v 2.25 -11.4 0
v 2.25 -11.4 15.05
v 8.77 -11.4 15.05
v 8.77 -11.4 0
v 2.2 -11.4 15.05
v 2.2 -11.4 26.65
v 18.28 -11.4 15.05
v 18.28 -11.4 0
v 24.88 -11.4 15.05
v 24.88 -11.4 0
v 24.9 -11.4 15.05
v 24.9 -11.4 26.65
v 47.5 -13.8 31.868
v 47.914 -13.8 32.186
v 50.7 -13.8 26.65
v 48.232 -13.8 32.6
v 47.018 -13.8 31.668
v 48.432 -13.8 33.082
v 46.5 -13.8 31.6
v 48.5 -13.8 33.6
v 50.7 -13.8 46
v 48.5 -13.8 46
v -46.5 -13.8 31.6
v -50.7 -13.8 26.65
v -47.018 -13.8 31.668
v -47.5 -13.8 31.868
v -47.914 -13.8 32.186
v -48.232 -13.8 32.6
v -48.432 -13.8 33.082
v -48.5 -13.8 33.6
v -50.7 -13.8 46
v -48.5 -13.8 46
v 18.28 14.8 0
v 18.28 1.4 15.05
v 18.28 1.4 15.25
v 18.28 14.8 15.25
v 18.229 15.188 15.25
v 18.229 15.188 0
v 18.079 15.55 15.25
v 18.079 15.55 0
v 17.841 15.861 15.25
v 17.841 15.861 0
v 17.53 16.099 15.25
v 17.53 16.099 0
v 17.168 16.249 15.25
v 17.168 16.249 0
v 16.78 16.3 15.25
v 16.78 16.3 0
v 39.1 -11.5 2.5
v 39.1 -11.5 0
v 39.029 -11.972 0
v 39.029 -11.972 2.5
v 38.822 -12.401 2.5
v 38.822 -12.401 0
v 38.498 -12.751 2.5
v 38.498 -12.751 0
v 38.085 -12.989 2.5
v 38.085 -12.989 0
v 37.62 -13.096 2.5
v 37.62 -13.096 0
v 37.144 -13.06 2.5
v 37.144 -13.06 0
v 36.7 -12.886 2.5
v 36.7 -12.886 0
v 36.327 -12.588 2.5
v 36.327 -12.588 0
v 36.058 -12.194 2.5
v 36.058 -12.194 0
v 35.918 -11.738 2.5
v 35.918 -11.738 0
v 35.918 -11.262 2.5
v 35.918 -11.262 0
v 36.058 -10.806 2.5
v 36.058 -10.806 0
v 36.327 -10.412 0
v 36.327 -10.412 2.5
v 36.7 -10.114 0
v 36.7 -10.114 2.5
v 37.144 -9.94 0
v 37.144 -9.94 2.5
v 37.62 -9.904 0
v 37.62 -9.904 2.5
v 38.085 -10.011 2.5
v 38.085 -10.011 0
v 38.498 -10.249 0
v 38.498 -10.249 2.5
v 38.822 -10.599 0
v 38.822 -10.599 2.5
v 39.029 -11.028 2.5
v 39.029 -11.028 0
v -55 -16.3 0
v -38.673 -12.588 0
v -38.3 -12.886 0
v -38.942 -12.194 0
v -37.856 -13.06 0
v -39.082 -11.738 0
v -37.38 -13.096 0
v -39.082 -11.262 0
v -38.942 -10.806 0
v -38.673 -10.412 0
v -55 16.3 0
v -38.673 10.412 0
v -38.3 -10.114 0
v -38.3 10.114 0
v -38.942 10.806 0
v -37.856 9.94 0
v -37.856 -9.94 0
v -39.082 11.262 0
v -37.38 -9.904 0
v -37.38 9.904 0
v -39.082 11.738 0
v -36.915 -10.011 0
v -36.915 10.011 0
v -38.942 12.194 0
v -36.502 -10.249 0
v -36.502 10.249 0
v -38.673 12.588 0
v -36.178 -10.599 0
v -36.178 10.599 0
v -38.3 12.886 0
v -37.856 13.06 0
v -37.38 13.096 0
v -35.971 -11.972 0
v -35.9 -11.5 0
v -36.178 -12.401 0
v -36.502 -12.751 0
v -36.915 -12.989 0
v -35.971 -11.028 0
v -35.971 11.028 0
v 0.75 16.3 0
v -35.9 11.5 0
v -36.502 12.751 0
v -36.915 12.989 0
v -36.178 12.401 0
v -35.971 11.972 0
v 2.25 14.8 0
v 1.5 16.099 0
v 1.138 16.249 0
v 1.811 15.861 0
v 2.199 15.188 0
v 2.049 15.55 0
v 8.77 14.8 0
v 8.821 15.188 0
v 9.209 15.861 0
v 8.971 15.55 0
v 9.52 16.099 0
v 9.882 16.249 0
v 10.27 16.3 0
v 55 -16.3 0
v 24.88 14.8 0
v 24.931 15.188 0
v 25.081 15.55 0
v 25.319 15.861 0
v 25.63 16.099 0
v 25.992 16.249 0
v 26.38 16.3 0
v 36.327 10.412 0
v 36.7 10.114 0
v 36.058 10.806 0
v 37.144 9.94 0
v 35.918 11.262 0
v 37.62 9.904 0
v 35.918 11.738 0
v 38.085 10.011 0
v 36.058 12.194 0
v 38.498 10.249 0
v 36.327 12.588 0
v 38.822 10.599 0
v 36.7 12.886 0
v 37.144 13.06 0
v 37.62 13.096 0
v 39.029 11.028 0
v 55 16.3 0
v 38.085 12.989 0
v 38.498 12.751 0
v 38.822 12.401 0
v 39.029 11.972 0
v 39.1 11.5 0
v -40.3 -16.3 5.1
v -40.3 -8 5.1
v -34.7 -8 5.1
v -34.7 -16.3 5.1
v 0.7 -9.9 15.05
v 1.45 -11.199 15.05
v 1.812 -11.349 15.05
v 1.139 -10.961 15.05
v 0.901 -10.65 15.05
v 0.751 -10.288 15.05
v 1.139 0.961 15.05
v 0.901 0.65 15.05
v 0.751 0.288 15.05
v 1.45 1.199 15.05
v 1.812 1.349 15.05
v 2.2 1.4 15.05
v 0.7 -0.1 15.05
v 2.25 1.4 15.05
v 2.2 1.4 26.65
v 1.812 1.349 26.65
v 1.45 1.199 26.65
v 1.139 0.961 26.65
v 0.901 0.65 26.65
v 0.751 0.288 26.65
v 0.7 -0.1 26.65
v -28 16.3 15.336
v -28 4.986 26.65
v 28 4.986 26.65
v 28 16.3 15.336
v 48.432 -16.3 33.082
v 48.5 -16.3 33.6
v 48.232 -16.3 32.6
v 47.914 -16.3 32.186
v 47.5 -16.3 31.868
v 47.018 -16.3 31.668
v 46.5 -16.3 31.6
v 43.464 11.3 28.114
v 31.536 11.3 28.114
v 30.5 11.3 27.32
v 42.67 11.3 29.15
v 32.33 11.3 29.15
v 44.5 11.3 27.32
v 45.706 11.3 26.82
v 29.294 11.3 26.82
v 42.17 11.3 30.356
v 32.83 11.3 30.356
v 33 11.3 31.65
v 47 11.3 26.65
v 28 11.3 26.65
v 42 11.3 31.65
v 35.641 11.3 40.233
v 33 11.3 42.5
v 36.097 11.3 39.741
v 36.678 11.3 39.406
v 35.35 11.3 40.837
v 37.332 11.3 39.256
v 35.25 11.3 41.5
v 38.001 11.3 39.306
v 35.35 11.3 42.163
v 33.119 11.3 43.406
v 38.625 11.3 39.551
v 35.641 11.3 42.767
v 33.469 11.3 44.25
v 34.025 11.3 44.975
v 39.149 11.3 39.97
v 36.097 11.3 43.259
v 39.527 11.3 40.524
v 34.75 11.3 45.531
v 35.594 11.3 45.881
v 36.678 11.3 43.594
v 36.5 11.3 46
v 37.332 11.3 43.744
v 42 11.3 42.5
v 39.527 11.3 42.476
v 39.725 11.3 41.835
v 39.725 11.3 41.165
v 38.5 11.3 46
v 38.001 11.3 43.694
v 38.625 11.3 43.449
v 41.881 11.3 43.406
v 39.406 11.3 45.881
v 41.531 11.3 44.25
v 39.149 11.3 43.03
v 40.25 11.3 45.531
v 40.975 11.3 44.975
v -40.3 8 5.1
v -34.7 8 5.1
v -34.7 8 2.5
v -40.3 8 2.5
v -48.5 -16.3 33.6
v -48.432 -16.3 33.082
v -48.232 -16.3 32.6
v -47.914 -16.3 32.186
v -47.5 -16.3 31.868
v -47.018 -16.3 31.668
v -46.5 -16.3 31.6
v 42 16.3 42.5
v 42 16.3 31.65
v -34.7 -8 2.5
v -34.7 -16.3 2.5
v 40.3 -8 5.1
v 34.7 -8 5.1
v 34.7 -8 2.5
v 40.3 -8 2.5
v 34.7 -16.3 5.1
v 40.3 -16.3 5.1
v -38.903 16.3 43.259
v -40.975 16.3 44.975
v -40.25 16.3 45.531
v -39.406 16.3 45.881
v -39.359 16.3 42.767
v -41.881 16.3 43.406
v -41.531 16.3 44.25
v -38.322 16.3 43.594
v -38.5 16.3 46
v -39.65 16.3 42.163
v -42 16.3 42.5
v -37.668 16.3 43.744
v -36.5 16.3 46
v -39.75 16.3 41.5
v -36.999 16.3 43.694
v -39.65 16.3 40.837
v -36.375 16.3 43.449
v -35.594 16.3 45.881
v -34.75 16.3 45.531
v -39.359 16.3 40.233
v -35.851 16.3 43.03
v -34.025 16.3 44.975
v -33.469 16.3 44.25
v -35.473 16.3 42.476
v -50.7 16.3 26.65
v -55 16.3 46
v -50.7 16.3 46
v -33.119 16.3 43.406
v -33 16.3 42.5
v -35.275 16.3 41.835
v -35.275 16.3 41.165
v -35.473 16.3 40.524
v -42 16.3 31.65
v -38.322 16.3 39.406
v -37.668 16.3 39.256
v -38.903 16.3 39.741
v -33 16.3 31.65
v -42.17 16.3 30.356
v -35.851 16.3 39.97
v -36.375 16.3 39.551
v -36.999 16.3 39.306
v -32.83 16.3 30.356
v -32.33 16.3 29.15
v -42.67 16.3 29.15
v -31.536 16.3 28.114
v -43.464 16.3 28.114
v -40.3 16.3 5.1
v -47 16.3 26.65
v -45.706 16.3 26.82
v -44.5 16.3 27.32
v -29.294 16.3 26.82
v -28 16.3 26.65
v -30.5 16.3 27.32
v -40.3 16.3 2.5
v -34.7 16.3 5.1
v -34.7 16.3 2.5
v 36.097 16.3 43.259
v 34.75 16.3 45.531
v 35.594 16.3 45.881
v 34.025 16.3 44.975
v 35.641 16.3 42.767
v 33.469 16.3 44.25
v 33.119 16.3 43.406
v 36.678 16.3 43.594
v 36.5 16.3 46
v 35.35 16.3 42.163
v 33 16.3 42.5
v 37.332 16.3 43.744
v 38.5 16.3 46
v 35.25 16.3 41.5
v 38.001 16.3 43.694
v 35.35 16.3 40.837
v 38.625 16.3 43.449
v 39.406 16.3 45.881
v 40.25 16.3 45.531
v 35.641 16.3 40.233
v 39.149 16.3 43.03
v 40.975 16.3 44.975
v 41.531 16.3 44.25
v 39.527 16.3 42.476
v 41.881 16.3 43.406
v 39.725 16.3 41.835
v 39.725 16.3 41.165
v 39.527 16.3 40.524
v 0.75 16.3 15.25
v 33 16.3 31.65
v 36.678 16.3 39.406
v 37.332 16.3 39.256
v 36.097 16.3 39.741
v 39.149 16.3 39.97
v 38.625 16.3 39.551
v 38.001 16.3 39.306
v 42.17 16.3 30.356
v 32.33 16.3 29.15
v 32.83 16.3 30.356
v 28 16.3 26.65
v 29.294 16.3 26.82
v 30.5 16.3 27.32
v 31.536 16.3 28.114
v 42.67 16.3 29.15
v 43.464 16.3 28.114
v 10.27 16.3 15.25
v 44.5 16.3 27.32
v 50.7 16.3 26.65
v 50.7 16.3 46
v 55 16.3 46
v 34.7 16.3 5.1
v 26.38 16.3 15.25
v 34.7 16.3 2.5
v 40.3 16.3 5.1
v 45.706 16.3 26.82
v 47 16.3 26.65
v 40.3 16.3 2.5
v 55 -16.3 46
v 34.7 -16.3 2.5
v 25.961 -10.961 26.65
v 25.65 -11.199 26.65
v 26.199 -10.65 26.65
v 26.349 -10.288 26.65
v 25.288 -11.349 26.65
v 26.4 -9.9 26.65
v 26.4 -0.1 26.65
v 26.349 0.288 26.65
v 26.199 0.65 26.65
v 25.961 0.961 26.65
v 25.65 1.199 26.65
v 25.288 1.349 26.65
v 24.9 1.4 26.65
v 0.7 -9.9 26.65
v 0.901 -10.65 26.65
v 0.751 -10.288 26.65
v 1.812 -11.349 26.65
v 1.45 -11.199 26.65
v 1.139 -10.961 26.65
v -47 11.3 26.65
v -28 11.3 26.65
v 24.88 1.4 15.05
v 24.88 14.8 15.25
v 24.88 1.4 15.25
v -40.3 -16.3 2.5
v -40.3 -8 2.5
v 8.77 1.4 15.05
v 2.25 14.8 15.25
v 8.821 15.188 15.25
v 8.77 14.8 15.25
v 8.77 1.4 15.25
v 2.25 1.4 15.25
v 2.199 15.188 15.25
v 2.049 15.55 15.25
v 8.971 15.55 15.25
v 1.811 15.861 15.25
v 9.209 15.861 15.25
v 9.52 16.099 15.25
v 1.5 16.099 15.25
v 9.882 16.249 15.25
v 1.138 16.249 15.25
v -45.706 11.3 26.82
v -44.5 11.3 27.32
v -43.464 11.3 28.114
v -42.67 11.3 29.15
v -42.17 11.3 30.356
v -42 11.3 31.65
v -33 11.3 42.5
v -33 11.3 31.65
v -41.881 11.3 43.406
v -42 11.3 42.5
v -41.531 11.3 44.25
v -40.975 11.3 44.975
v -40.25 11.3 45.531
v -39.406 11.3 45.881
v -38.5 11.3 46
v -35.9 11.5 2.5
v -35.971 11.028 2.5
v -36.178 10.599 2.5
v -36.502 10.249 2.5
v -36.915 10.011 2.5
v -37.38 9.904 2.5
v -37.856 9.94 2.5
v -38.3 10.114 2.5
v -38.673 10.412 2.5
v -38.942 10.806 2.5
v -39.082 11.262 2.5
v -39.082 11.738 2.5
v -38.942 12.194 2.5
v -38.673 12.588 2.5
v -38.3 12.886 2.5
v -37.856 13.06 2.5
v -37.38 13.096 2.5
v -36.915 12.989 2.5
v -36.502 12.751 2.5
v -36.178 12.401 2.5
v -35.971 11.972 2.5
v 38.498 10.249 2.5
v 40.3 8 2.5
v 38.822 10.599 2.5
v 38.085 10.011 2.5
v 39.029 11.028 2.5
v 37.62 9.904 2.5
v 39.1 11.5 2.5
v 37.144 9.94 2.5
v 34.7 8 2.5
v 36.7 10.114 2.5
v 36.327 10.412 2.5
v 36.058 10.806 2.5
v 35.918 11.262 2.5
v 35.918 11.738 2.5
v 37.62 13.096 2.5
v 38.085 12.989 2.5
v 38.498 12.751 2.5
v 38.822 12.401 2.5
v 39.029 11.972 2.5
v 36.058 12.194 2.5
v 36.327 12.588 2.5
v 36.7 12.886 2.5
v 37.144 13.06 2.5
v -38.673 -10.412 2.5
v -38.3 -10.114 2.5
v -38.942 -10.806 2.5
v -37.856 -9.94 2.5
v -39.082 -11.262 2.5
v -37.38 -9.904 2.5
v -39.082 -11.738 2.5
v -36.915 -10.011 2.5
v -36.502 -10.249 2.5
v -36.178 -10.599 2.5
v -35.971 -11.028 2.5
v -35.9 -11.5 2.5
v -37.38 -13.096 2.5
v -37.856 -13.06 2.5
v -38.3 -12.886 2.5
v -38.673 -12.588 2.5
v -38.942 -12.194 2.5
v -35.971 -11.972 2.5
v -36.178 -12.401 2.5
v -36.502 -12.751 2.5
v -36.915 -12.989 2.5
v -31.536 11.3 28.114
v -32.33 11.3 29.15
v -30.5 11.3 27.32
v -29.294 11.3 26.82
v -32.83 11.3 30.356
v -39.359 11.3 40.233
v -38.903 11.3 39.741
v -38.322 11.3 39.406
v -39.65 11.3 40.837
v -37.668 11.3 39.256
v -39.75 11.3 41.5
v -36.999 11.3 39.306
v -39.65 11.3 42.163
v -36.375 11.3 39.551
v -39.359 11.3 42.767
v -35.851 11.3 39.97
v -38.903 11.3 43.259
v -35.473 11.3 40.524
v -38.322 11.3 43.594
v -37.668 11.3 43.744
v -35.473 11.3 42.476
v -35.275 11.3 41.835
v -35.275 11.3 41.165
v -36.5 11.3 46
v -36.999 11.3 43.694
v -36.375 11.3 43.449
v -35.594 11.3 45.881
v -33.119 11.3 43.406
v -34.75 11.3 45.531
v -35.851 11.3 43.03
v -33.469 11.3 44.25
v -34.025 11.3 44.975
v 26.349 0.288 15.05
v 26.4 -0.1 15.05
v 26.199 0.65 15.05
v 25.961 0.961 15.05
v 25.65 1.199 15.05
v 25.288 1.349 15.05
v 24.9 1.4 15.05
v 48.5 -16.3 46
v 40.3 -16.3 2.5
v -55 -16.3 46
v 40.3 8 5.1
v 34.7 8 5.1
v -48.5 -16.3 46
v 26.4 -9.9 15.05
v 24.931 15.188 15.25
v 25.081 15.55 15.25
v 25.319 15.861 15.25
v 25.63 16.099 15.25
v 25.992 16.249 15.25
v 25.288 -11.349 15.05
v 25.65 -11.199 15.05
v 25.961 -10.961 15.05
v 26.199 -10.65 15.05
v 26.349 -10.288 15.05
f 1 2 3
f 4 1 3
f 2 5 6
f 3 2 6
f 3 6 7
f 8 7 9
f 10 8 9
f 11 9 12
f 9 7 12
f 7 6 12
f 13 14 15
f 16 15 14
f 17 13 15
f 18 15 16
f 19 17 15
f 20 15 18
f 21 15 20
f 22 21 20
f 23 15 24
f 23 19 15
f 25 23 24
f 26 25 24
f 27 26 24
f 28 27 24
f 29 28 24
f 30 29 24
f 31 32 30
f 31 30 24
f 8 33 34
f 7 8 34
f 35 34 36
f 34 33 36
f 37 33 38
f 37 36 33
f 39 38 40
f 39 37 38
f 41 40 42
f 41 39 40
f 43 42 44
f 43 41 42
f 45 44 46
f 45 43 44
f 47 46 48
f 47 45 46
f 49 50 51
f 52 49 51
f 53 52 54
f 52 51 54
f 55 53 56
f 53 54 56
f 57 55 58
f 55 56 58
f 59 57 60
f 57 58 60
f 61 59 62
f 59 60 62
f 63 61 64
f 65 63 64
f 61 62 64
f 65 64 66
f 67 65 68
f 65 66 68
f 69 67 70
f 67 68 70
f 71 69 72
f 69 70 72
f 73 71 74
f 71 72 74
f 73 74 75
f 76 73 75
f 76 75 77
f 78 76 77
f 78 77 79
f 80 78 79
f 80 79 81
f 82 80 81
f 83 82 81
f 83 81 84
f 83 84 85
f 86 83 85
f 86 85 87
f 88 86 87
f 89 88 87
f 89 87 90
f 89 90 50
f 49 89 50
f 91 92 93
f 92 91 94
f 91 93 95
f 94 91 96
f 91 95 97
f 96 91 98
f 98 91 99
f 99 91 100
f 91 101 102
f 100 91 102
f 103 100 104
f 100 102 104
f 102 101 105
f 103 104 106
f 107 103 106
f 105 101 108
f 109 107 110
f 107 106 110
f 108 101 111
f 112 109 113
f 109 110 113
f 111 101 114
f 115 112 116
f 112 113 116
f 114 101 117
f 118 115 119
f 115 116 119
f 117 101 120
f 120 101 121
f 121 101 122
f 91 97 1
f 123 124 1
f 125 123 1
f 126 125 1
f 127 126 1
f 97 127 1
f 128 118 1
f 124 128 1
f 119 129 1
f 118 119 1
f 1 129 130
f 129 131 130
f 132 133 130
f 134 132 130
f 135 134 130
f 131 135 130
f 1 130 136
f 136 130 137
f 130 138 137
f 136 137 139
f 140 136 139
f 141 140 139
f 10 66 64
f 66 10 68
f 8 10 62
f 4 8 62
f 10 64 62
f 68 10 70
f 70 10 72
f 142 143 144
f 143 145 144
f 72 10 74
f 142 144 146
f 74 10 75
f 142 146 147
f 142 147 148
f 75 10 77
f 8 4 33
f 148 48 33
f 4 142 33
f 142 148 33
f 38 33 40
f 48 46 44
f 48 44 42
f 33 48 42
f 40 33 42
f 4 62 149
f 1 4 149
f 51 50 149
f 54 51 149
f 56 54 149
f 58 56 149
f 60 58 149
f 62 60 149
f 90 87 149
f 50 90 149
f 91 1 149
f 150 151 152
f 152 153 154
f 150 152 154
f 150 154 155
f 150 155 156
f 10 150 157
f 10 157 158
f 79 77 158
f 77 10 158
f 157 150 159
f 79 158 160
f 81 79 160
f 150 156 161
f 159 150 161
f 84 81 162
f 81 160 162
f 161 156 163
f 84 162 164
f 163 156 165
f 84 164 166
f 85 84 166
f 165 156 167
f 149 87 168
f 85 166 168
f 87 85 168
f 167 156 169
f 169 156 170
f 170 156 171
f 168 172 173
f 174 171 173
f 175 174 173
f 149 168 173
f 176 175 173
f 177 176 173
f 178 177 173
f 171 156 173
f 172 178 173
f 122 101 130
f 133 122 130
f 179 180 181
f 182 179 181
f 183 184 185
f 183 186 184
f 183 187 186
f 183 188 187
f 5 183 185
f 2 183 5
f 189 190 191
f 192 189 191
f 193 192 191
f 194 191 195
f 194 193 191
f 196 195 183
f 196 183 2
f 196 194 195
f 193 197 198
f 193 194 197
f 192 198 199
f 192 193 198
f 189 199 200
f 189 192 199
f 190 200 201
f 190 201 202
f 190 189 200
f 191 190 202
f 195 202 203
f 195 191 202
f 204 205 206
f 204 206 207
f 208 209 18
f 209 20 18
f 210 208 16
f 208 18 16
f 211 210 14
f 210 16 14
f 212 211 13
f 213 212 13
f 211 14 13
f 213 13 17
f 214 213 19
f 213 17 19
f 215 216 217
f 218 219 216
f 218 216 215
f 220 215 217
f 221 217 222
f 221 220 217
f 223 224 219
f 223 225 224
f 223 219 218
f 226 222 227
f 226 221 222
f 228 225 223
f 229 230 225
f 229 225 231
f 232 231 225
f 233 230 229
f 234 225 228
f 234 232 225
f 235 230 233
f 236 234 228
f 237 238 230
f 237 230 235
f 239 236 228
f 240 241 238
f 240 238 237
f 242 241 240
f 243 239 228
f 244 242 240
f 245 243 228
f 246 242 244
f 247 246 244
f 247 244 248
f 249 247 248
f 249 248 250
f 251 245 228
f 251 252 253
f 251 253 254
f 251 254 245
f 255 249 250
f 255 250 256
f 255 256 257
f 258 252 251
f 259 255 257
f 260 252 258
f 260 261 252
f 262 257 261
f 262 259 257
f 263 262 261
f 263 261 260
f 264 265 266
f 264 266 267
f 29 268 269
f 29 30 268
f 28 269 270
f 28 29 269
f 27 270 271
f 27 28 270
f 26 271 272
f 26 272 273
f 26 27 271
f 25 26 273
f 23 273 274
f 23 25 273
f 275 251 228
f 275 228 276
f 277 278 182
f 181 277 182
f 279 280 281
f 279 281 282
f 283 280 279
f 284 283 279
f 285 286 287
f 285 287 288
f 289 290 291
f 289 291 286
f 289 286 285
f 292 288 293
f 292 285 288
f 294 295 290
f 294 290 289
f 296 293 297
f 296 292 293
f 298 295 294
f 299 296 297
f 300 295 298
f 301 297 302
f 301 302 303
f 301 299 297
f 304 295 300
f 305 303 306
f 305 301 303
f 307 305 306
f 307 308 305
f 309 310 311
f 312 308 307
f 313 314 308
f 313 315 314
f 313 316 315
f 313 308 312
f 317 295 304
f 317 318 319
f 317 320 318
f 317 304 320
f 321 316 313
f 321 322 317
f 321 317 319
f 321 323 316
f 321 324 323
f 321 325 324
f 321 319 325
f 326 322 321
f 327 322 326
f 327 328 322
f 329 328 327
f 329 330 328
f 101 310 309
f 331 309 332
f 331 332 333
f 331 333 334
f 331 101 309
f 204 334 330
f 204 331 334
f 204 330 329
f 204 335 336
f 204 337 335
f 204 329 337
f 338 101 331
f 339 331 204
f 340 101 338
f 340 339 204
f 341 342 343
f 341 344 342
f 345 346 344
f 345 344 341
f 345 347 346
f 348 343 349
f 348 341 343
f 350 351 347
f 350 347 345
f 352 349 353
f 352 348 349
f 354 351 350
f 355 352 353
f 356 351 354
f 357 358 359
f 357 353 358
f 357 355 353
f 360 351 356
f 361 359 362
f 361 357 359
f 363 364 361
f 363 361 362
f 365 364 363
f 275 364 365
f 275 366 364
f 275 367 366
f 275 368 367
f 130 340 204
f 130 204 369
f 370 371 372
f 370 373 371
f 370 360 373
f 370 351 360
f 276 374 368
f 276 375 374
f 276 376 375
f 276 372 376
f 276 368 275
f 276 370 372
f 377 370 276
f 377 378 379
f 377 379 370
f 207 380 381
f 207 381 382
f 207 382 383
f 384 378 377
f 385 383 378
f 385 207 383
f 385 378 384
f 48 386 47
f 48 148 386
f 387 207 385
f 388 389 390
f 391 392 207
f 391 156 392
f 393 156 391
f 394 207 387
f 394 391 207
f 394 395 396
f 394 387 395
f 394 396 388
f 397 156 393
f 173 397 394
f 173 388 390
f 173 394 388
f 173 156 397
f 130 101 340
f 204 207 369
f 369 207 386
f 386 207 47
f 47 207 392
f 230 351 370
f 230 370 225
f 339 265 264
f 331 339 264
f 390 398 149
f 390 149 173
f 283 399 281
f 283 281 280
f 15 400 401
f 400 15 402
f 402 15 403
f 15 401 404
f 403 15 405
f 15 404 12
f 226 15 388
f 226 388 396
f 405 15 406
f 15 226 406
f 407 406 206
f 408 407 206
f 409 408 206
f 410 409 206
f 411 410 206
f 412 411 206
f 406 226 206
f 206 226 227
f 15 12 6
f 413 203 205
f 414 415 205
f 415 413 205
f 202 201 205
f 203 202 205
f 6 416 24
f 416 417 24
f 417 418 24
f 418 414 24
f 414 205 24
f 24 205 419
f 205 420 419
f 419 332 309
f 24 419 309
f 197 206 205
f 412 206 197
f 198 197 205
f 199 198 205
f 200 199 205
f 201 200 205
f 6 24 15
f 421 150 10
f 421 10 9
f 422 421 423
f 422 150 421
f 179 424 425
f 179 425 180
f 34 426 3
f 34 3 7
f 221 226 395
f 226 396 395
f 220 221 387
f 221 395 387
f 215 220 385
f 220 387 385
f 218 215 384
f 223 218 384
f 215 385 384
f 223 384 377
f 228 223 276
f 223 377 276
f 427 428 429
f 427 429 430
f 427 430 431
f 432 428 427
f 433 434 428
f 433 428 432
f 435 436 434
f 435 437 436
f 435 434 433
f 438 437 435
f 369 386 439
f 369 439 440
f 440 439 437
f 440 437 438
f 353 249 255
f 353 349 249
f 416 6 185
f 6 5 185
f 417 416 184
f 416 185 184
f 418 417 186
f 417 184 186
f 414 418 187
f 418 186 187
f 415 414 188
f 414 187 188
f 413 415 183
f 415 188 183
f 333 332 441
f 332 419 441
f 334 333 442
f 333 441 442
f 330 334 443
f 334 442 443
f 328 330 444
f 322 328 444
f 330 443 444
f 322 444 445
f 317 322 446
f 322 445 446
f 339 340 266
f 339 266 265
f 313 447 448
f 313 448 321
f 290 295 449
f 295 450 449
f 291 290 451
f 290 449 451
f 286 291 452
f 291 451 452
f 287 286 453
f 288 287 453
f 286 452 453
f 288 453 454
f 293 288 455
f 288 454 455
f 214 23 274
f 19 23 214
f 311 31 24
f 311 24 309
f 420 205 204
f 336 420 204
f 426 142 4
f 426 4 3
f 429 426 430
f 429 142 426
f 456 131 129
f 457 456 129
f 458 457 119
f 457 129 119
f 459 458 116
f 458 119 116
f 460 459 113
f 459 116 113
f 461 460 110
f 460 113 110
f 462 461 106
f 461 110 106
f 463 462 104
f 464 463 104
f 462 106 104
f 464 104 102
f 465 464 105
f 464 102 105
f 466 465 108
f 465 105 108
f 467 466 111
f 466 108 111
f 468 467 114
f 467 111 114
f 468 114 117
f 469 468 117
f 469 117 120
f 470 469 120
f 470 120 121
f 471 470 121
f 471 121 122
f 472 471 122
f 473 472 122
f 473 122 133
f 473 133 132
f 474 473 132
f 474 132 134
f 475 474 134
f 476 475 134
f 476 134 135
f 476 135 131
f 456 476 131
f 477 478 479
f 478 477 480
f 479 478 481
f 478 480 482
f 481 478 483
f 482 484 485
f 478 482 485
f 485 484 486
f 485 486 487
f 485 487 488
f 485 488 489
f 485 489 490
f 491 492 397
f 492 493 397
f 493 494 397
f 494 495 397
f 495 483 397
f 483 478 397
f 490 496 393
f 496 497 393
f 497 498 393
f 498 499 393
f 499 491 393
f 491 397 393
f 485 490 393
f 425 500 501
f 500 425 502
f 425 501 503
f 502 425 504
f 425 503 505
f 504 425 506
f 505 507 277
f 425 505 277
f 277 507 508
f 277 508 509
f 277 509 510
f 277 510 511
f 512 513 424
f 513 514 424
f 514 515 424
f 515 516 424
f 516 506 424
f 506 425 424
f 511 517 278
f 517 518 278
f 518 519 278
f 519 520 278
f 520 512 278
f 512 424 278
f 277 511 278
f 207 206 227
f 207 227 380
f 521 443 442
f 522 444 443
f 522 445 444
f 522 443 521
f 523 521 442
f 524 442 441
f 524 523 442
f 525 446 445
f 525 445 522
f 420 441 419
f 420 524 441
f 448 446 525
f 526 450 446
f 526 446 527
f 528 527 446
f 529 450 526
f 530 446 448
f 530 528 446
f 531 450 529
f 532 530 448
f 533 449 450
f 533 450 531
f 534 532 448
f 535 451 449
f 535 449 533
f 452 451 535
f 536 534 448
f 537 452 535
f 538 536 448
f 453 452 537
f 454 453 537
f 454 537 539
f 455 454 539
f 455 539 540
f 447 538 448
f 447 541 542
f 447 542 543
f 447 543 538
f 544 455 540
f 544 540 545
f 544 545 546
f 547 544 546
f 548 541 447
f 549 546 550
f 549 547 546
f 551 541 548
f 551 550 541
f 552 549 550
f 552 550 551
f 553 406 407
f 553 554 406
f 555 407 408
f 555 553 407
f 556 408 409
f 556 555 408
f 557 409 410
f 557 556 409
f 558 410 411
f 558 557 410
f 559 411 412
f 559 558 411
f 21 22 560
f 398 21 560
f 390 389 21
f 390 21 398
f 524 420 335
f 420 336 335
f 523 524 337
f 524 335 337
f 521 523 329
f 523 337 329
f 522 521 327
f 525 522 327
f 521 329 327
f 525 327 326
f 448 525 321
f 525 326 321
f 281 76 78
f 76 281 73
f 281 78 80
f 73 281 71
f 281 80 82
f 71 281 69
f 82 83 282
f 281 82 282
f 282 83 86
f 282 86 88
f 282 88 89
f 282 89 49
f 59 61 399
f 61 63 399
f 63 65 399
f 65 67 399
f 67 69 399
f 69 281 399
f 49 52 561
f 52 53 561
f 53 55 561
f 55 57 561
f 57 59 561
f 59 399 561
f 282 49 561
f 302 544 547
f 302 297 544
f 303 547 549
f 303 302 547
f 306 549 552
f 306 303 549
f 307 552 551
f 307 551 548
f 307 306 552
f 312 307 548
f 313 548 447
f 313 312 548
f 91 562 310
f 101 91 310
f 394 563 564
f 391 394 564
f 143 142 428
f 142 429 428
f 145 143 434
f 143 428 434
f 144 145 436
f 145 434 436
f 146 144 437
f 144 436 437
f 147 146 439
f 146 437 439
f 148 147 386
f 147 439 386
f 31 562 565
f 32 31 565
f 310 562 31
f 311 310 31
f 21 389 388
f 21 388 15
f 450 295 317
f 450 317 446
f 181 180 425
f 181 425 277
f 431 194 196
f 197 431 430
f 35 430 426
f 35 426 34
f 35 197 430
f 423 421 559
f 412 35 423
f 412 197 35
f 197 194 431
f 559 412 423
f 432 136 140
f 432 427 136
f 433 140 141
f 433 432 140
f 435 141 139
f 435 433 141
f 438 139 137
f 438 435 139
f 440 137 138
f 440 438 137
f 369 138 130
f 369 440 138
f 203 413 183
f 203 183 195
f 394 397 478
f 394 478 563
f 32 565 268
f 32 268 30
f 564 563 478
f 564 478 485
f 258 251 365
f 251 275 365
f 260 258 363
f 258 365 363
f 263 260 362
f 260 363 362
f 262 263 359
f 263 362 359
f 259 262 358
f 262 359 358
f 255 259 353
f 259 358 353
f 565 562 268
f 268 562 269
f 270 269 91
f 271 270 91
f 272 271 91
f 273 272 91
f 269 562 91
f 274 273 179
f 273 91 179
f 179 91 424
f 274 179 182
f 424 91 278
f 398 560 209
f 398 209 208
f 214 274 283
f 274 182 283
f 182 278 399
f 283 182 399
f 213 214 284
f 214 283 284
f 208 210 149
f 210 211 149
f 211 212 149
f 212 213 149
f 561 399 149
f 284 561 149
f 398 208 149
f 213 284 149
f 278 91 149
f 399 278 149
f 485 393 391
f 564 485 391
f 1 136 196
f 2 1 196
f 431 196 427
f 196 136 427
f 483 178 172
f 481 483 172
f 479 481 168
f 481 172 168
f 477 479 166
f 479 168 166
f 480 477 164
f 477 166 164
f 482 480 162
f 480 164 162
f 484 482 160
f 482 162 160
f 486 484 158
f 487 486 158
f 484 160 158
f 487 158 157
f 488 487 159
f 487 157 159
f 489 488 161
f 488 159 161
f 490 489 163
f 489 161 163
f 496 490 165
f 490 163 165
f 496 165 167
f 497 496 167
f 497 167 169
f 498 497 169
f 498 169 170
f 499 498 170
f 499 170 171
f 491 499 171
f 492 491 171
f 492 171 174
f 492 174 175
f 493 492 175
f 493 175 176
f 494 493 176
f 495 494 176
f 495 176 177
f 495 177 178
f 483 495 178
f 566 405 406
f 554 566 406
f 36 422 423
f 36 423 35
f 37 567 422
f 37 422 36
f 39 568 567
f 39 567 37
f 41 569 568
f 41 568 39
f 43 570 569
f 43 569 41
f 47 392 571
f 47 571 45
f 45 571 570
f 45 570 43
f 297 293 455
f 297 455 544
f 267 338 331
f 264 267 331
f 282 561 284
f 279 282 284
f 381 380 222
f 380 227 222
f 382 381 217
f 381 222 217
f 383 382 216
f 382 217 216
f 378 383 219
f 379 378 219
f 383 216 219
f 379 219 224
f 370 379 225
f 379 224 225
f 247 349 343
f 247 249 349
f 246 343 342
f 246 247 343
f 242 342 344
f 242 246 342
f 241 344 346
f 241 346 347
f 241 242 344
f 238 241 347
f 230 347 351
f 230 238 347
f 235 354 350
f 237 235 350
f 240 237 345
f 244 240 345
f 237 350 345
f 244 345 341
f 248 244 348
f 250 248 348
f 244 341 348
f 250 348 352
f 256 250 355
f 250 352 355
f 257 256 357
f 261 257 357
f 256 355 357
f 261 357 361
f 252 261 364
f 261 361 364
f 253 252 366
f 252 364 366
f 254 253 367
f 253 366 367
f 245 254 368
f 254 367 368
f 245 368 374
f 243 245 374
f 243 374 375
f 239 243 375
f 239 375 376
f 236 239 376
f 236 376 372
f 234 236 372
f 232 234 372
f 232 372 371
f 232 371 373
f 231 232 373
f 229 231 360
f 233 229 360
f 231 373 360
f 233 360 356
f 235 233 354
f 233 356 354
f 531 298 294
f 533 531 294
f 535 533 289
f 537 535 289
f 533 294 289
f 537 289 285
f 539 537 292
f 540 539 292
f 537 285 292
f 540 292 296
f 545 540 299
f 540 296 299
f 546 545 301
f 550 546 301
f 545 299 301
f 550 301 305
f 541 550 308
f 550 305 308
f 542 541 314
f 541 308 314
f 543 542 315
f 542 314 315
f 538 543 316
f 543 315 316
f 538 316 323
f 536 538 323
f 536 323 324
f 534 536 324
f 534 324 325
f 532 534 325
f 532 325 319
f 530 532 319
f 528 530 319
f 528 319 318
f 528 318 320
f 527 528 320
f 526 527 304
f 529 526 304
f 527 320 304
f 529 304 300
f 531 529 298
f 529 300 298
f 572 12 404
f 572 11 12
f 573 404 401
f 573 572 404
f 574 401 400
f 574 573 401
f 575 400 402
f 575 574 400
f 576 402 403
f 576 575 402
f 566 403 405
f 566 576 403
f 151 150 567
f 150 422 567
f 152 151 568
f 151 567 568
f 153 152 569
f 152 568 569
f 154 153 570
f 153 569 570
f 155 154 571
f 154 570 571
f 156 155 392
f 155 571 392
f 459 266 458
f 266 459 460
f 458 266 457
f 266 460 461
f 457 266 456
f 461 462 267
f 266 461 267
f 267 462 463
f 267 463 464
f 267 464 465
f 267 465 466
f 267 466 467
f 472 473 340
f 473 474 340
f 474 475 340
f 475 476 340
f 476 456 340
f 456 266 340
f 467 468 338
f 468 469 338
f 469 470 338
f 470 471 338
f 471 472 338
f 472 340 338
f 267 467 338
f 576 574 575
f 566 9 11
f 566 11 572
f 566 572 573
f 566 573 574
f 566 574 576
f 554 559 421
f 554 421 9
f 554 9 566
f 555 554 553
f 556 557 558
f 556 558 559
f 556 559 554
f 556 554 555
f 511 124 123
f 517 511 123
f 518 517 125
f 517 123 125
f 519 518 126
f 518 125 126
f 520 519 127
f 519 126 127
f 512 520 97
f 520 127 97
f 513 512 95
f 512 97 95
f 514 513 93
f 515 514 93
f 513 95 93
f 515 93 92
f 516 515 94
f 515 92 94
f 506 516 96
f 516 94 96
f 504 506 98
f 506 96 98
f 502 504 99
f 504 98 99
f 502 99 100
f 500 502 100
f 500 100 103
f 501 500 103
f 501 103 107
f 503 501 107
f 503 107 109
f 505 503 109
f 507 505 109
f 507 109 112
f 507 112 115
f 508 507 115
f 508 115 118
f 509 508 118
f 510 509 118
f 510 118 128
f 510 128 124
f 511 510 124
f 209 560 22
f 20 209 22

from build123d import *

# Parameters (mm, degrees)
SKETCH028_W     = 110
SKETCH028_H     = 32.6
PAD019_DEPTH    = 46
POCKET009_DEPTH = 19.35
SKETCH030_R     = 2.25
POCKET010_DEPTH = 5
FILLET008_R     = 3.5
SKETCH031_W     = 97
SKETCH031_H     = 2.5
POCKET011_DEPTH = 14.4
FILLET009_R     = 2
FILLET010_R     = 5
SKETCH032_W     = 25.7
SKETCH032_H     = 12.8
POCKET012_DEPTH = 11.6
SKETCH033_W     = 6.52
SKETCH033_H     = 12.8
SKETCH033_W_2   = 6.6
POCKET013_DEPTH = 22
SKETCH034_W     = 6.6
SKETCH034_H     = 15.25
SKETCH034_W_2   = 6.52
POCKET014_DEPTH = 17.55
FILLET011_R     = 1.5
SKETCH035_R     = 1.6
POCKET015_DEPTH = 5
SKETCH036_W     = 5.6
SKETCH036_H     = 2.6
POCKET016_DEPTH = 8.3
SKETCH037_W     = 5.6
SKETCH037_H     = 2.6
POCKET017_DEPTH = 8.3
PRISM_DEPTH     = 56


with BuildPart() as part:
    # Sketch028 → Pad019 (new body)
    with BuildSketch(Plane.XY):
        Rectangle(SKETCH028_W, SKETCH028_H)
    extrude(amount=PAD019_DEPTH)

    # Sketch029 (on Face6 of Pad019) → Pocket009 (cut)
    with BuildSketch(Plane.XY.offset(46)):
        Polygon((-50.7, 16.3), (-42, 16.3), (-42, 11.3), (-33, 11.3), (-33, 16.3), (33, 16.3), (33, 11.3), (42, 11.3), (42, 16.3), (50.7, 16.3), (50.7, -13.8), (-50.7, -13.8), align=None)
    extrude(amount=-POCKET009_DEPTH, mode=Mode.SUBTRACT)

    # Sketch030 (on Face1 of Pocket009) → Pocket010 (cut)
    with BuildSketch(Plane(origin=(0, 16.3, 0), x_dir=(-1, 0, 0), z_dir=(0, 1, 0))):
        with Locations((-37.5, 41.5)):
            Circle(SKETCH030_R)
        with Locations((37.5, 41.5)):
            Circle(SKETCH030_R)
    extrude(amount=-POCKET010_DEPTH, mode=Mode.SUBTRACT)

    # Fillet008
    fillet008_edges = [part.edges().sort_by_distance(p)[0] for p in [
        (33, 13.8, 46),
        (-33, 13.8, 46),
        (-42, 13.8, 46),
        (42, 13.8, 46),
    ]]
    fillet(fillet008_edges, radius=FILLET008_R)

    # Sketch031 (on Face8 of Fillet008) → Pocket011 (cut)
    with BuildSketch(Plane.XY.offset(46)):
        with Locations((0, -15.05)):
            Rectangle(SKETCH031_W, SKETCH031_H)
    extrude(amount=-POCKET011_DEPTH, mode=Mode.SUBTRACT)

    # Fillet009
    fillet009_edges = [part.edges().sort_by_distance(p)[0] for p in [
        (48.5, -15.05, 31.6),
        (-48.5, -15.05, 31.6),
    ]]
    fillet(fillet009_edges, radius=FILLET009_R)

    # Fillet010
    fillet010_edges = [part.edges().sort_by_distance(p)[0] for p in [
        (42, 13.8, 26.65),
        (-33, 13.8, 26.65),
        (33, 13.8, 26.65),
        (-42, 13.8, 26.65),
    ]]
    fillet(fillet010_edges, radius=FILLET010_R)

    # Sketch032 (on Face1 of Fillet010) → Pocket012 (cut)
    with BuildSketch(Plane.XY.offset(26.65)):
        with Locations((13.55, -5)):
            Rectangle(SKETCH032_W, SKETCH032_H)
    extrude(amount=-POCKET012_DEPTH, mode=Mode.SUBTRACT)

    # Sketch033 (on Face38 of Pocket012) → Pocket013 (cut)
    with BuildSketch(Plane.XY.offset(15.05)):
        with Locations((5.51, -5)):
            Rectangle(SKETCH033_W, SKETCH033_H)
        with Locations((21.58, -5)):
            Rectangle(SKETCH033_W_2, SKETCH033_H)
    extrude(amount=-POCKET013_DEPTH, mode=Mode.SUBTRACT)

    # Sketch034 (on Face2 of Pocket013) → Pocket014 (cut)
    with BuildSketch(Plane(origin=(0, 16.3, 0), x_dir=(-1, 0, 0), z_dir=(0, 1, 0))):
        with Locations((-21.58, 7.625)):
            Rectangle(SKETCH034_W, SKETCH034_H)
        with Locations((-5.51, 7.625)):
            Rectangle(SKETCH034_W_2, SKETCH034_H)
    extrude(amount=-POCKET014_DEPTH, mode=Mode.SUBTRACT)

    # Fillet011
    fillet011_edges = [part.edges().sort_by_distance(p)[0] for p in [
        (0.7, 1.4, 20.85),
        (26.4, -11.4, 20.85),
        (0.7, -11.4, 20.85),
        (26.4, 1.4, 20.85),
        (24.88, 16.3, 7.625),
        (18.28, 16.3, 7.625),
        (8.77, 16.3, 7.625),
        (2.25, 16.3, 7.625),
    ]]
    fillet(fillet011_edges, radius=FILLET011_R)

    # Sketch035 (on Face31 of Fillet011) → Pocket015 (cut)
    with BuildSketch(Plane(origin=(0, 0, 0), x_dir=(1, 0, 0), z_dir=(0, 0, -1))):
        with Locations((-37.5, 11.5)):
            Circle(SKETCH035_R)
        with Locations((-37.5, -11.5)):
            Circle(SKETCH035_R)
        with Locations((37.5, -11.5)):
            Circle(SKETCH035_R)
        with Locations((37.5, 11.5)):
            Circle(SKETCH035_R)
    extrude(amount=-POCKET015_DEPTH, mode=Mode.SUBTRACT)

    # Sketch036 (on Face10 of Pocket015) → Pocket016 (cut)
    with BuildSketch(Plane(origin=(0, 16.3, 0), x_dir=(-1, 0, 0), z_dir=(0, 1, 0))):
        with Locations((-37.5, 3.8)):
            Rectangle(SKETCH036_W, SKETCH036_H)
        with Locations((37.5, 3.8)):
            Rectangle(SKETCH036_W, SKETCH036_H)
    extrude(amount=-POCKET016_DEPTH, mode=Mode.SUBTRACT)

    # Sketch037 (on Face65 of Pocket015) → Pocket017 (cut)
    with BuildSketch(Plane.XZ.offset(16.3)):
        with Locations((-37.5, 3.8)):
            Rectangle(SKETCH037_W, SKETCH037_H)
        with Locations((37.5, 3.8)):
            Rectangle(SKETCH037_W, SKETCH037_H)
    extrude(amount=-POCKET017_DEPTH, mode=Mode.SUBTRACT)

    # Prism → Prism (cut)
    with BuildSketch(Plane(origin=(-28, 16.3, 26.65), x_dir=(0, 0.707107, 0.707107), z_dir=(1, 0, 0))):
        Polygon((16, 0), (-8, 13.856406), (-8, -13.856406), align=None)
    extrude(amount=PRISM_DEPTH, mode=Mode.SUBTRACT)


solid = part.part
